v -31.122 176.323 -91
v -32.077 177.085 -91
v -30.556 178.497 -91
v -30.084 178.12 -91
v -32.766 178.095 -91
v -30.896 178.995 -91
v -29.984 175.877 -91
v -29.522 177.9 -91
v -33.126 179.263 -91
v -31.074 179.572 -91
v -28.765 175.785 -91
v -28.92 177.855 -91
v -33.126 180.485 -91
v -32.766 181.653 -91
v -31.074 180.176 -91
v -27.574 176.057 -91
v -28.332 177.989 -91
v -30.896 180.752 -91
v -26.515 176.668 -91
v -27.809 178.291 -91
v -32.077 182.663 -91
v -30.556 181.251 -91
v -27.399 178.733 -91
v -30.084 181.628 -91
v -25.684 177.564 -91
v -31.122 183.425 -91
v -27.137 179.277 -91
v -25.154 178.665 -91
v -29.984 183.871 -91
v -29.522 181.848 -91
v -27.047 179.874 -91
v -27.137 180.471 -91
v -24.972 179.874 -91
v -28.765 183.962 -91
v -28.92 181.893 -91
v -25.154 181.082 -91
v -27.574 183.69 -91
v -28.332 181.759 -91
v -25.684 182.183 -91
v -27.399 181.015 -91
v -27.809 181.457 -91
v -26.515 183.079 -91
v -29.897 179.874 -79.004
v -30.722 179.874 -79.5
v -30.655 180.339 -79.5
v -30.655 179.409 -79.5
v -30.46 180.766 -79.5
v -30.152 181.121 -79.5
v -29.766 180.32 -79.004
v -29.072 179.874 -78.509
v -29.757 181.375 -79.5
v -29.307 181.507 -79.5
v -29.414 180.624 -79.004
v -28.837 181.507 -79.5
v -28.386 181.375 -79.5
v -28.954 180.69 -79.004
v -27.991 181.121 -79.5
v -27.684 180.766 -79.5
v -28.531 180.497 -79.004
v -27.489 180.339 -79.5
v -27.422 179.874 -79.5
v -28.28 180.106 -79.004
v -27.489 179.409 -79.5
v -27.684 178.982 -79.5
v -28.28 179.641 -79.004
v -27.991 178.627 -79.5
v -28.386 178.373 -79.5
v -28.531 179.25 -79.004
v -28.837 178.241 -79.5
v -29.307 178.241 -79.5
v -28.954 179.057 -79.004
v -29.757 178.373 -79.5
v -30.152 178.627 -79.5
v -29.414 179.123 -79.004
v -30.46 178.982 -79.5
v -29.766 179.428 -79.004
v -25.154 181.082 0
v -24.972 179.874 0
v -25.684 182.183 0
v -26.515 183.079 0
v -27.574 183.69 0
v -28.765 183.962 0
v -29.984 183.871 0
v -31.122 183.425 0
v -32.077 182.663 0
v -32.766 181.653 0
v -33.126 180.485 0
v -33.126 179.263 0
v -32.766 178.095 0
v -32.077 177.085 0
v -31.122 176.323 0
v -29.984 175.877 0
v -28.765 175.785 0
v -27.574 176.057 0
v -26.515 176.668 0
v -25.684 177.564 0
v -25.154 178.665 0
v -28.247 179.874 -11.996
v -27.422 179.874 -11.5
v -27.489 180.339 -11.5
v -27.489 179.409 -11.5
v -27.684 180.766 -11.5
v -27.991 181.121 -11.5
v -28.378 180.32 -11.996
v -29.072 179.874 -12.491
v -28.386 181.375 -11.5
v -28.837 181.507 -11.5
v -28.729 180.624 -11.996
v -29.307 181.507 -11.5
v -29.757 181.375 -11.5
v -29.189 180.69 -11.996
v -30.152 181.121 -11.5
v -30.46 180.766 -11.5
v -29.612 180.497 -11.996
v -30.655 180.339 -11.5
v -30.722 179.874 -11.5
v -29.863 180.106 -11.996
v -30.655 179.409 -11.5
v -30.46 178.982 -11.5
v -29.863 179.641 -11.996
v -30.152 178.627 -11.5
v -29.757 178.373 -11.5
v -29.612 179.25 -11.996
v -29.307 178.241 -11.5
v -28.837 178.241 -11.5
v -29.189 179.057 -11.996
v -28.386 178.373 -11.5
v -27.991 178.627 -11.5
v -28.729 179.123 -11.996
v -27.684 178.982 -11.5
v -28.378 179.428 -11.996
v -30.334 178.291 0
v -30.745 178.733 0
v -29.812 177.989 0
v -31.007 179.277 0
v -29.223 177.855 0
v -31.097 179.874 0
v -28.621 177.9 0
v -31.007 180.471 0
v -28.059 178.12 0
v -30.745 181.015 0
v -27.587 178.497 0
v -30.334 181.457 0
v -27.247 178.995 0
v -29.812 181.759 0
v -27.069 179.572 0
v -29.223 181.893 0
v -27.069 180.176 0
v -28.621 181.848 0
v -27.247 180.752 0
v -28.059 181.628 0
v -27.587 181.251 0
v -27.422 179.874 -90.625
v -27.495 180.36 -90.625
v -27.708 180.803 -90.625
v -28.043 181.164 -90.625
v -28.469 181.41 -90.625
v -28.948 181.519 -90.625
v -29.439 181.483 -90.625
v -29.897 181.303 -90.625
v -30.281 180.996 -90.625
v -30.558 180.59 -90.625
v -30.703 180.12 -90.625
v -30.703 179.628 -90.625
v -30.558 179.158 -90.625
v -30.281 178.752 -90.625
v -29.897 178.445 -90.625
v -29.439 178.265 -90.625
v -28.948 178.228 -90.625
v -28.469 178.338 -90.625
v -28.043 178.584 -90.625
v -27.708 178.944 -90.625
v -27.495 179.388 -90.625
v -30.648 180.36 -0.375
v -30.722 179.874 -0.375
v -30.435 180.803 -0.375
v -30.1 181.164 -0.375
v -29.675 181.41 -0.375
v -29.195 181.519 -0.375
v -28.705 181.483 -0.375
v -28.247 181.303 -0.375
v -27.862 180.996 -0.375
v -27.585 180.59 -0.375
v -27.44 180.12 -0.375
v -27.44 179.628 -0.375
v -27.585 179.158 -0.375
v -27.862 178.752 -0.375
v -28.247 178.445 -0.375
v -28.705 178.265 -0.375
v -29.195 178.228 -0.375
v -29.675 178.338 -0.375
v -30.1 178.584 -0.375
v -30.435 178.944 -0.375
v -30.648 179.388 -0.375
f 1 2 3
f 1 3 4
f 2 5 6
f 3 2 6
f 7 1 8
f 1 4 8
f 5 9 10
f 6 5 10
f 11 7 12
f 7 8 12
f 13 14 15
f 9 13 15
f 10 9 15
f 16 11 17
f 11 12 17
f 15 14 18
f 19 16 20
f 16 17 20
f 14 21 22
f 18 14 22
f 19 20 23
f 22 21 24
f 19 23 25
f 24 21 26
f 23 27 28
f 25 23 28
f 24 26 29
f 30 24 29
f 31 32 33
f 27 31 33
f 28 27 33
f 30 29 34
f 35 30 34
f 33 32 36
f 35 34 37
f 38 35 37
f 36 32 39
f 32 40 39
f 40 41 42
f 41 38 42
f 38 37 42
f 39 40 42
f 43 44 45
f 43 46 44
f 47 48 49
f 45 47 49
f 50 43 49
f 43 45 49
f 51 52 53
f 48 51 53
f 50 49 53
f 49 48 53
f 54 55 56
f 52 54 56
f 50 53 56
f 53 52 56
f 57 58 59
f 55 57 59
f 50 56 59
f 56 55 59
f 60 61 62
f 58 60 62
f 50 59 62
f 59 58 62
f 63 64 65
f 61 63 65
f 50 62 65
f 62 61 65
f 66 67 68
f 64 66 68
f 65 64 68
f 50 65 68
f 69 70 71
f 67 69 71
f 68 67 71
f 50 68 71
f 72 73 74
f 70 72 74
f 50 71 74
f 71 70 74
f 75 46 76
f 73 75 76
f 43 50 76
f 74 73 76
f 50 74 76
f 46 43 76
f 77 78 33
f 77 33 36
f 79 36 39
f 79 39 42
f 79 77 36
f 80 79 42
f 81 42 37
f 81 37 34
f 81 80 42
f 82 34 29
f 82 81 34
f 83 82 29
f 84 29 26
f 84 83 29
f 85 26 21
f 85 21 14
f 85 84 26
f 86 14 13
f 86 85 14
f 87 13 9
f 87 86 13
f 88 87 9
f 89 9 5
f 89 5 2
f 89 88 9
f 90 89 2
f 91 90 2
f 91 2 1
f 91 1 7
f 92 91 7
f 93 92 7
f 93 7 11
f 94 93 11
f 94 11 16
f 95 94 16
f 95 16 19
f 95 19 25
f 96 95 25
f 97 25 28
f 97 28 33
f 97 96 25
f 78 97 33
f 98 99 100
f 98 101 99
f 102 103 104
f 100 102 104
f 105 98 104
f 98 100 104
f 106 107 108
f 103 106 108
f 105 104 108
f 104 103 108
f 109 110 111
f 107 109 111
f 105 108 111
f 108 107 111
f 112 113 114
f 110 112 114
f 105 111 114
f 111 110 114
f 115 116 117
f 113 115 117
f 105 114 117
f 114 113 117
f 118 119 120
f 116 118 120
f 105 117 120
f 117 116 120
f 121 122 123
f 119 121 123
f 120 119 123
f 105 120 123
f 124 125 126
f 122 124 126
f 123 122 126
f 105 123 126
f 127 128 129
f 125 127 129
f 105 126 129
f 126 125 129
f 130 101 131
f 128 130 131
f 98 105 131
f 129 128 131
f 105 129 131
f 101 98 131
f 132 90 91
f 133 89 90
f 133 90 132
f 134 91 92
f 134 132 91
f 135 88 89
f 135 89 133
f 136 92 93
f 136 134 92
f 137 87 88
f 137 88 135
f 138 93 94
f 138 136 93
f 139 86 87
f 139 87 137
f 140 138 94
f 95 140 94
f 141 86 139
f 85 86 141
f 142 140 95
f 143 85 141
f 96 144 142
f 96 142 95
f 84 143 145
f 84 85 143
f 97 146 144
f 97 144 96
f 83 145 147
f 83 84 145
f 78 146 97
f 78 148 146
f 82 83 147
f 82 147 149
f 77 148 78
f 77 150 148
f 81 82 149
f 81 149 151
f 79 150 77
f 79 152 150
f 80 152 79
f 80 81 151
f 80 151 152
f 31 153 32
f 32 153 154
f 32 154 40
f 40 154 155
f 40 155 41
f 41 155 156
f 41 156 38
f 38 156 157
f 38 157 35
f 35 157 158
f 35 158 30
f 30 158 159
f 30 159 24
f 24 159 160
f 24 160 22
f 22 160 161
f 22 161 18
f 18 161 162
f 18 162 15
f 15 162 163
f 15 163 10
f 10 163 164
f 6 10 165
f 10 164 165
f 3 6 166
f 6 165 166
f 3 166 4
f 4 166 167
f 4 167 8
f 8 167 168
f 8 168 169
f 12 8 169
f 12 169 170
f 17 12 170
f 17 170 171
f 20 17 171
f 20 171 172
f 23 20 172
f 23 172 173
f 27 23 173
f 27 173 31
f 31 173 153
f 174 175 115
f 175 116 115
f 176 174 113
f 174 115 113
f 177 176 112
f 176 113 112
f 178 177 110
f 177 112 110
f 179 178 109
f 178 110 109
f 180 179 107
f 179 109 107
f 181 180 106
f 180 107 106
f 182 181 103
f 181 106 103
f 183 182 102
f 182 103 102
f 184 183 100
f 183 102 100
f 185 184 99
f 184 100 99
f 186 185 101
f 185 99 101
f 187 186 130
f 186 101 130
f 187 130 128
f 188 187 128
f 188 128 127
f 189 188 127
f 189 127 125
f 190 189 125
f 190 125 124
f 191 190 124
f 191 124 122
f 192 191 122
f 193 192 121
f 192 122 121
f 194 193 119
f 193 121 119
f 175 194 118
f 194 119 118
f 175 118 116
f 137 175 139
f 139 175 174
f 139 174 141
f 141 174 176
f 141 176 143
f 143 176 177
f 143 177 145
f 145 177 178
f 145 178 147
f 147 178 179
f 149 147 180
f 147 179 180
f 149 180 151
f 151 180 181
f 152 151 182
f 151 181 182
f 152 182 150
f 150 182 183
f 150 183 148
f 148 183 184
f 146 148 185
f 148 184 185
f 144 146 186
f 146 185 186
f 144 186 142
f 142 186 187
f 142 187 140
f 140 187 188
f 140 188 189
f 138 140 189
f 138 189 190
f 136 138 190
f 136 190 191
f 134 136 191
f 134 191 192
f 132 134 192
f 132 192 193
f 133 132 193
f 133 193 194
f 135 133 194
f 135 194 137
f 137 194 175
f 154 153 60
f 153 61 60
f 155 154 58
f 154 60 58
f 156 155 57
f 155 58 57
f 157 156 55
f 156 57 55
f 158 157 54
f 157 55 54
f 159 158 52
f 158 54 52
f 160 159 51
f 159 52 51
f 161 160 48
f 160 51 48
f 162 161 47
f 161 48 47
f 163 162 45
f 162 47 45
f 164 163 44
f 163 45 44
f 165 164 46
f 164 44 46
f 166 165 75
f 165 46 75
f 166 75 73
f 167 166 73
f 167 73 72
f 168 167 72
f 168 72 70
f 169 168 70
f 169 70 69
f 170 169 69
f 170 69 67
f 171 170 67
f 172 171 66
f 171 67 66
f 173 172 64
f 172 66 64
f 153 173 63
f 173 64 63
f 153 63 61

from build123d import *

# Parameters (mm, degrees)
ESBO_O1_R                           = 4.1
RESSALTO_EXTRUS_O1_DEPTH            = 91
FURO_ROSCADO_DE_M4X0_71_D           = 3.3
FURO_ROSCADO_DE_M4X0_71_DEPTH       = 11.5
FURO_ROSCADO_DE_M4X0_71_CSINK_D     = 4.05
FURO_ROSCADO_DE_M4X0_71_CSINK_ANGLE = 90
FURO_ROSCADO_DE_M4X0_71_TIP         = 0.991420021
FURO_ROSCADO_DE_M4X0_72_D           = 3.3
FURO_ROSCADO_DE_M4X0_72_DEPTH       = 11.5
FURO_ROSCADO_DE_M4X0_72_CSINK_D     = 4.05
FURO_ROSCADO_DE_M4X0_72_CSINK_ANGLE = 90
FURO_ROSCADO_DE_M4X0_72_TIP         = 0.991420021


with BuildPart() as part:
    # Esboço1 → Ressalto-extrusão1 (new body)
    with BuildSketch(Plane.XY):
        with Locations((-29.071712183, 179.873872767)):
            Circle(ESBO_O1_R)
    extrude(amount=-RESSALTO_EXTRUS_O1_DEPTH)

    # Furo roscado de M4x0.71
    with Locations(Plane.XY):
        with Locations((-29.071712183, 179.873872767)):
            CounterSinkHole(FURO_ROSCADO_DE_M4X0_71_D / 2, FURO_ROSCADO_DE_M4X0_71_CSINK_D / 2, depth=FURO_ROSCADO_DE_M4X0_71_DEPTH, counter_sink_angle=FURO_ROSCADO_DE_M4X0_71_CSINK_ANGLE)
            with Locations((0, 0, -(FURO_ROSCADO_DE_M4X0_71_DEPTH + FURO_ROSCADO_DE_M4X0_71_TIP / 2))):  # 118° drill point
                Cone(0, FURO_ROSCADO_DE_M4X0_71_D / 2, FURO_ROSCADO_DE_M4X0_71_TIP, mode=Mode.SUBTRACT)

    # Furo roscado de M4x0.72
    with Locations(Plane(origin=(0, 0, -91), x_dir=(-1, 0, 0), z_dir=(0, 0, -1))):
        with Locations((29.071712183, 179.873872767)):
            CounterSinkHole(FURO_ROSCADO_DE_M4X0_72_D / 2, FURO_ROSCADO_DE_M4X0_72_CSINK_D / 2, depth=FURO_ROSCADO_DE_M4X0_72_DEPTH, counter_sink_angle=FURO_ROSCADO_DE_M4X0_72_CSINK_ANGLE)
            with Locations((0, 0, -(FURO_ROSCADO_DE_M4X0_72_DEPTH + FURO_ROSCADO_DE_M4X0_72_TIP / 2))):  # 118° drill point
                Cone(0, FURO_ROSCADO_DE_M4X0_72_D / 2, FURO_ROSCADO_DE_M4X0_72_TIP, mode=Mode.SUBTRACT)


solid = part.part
